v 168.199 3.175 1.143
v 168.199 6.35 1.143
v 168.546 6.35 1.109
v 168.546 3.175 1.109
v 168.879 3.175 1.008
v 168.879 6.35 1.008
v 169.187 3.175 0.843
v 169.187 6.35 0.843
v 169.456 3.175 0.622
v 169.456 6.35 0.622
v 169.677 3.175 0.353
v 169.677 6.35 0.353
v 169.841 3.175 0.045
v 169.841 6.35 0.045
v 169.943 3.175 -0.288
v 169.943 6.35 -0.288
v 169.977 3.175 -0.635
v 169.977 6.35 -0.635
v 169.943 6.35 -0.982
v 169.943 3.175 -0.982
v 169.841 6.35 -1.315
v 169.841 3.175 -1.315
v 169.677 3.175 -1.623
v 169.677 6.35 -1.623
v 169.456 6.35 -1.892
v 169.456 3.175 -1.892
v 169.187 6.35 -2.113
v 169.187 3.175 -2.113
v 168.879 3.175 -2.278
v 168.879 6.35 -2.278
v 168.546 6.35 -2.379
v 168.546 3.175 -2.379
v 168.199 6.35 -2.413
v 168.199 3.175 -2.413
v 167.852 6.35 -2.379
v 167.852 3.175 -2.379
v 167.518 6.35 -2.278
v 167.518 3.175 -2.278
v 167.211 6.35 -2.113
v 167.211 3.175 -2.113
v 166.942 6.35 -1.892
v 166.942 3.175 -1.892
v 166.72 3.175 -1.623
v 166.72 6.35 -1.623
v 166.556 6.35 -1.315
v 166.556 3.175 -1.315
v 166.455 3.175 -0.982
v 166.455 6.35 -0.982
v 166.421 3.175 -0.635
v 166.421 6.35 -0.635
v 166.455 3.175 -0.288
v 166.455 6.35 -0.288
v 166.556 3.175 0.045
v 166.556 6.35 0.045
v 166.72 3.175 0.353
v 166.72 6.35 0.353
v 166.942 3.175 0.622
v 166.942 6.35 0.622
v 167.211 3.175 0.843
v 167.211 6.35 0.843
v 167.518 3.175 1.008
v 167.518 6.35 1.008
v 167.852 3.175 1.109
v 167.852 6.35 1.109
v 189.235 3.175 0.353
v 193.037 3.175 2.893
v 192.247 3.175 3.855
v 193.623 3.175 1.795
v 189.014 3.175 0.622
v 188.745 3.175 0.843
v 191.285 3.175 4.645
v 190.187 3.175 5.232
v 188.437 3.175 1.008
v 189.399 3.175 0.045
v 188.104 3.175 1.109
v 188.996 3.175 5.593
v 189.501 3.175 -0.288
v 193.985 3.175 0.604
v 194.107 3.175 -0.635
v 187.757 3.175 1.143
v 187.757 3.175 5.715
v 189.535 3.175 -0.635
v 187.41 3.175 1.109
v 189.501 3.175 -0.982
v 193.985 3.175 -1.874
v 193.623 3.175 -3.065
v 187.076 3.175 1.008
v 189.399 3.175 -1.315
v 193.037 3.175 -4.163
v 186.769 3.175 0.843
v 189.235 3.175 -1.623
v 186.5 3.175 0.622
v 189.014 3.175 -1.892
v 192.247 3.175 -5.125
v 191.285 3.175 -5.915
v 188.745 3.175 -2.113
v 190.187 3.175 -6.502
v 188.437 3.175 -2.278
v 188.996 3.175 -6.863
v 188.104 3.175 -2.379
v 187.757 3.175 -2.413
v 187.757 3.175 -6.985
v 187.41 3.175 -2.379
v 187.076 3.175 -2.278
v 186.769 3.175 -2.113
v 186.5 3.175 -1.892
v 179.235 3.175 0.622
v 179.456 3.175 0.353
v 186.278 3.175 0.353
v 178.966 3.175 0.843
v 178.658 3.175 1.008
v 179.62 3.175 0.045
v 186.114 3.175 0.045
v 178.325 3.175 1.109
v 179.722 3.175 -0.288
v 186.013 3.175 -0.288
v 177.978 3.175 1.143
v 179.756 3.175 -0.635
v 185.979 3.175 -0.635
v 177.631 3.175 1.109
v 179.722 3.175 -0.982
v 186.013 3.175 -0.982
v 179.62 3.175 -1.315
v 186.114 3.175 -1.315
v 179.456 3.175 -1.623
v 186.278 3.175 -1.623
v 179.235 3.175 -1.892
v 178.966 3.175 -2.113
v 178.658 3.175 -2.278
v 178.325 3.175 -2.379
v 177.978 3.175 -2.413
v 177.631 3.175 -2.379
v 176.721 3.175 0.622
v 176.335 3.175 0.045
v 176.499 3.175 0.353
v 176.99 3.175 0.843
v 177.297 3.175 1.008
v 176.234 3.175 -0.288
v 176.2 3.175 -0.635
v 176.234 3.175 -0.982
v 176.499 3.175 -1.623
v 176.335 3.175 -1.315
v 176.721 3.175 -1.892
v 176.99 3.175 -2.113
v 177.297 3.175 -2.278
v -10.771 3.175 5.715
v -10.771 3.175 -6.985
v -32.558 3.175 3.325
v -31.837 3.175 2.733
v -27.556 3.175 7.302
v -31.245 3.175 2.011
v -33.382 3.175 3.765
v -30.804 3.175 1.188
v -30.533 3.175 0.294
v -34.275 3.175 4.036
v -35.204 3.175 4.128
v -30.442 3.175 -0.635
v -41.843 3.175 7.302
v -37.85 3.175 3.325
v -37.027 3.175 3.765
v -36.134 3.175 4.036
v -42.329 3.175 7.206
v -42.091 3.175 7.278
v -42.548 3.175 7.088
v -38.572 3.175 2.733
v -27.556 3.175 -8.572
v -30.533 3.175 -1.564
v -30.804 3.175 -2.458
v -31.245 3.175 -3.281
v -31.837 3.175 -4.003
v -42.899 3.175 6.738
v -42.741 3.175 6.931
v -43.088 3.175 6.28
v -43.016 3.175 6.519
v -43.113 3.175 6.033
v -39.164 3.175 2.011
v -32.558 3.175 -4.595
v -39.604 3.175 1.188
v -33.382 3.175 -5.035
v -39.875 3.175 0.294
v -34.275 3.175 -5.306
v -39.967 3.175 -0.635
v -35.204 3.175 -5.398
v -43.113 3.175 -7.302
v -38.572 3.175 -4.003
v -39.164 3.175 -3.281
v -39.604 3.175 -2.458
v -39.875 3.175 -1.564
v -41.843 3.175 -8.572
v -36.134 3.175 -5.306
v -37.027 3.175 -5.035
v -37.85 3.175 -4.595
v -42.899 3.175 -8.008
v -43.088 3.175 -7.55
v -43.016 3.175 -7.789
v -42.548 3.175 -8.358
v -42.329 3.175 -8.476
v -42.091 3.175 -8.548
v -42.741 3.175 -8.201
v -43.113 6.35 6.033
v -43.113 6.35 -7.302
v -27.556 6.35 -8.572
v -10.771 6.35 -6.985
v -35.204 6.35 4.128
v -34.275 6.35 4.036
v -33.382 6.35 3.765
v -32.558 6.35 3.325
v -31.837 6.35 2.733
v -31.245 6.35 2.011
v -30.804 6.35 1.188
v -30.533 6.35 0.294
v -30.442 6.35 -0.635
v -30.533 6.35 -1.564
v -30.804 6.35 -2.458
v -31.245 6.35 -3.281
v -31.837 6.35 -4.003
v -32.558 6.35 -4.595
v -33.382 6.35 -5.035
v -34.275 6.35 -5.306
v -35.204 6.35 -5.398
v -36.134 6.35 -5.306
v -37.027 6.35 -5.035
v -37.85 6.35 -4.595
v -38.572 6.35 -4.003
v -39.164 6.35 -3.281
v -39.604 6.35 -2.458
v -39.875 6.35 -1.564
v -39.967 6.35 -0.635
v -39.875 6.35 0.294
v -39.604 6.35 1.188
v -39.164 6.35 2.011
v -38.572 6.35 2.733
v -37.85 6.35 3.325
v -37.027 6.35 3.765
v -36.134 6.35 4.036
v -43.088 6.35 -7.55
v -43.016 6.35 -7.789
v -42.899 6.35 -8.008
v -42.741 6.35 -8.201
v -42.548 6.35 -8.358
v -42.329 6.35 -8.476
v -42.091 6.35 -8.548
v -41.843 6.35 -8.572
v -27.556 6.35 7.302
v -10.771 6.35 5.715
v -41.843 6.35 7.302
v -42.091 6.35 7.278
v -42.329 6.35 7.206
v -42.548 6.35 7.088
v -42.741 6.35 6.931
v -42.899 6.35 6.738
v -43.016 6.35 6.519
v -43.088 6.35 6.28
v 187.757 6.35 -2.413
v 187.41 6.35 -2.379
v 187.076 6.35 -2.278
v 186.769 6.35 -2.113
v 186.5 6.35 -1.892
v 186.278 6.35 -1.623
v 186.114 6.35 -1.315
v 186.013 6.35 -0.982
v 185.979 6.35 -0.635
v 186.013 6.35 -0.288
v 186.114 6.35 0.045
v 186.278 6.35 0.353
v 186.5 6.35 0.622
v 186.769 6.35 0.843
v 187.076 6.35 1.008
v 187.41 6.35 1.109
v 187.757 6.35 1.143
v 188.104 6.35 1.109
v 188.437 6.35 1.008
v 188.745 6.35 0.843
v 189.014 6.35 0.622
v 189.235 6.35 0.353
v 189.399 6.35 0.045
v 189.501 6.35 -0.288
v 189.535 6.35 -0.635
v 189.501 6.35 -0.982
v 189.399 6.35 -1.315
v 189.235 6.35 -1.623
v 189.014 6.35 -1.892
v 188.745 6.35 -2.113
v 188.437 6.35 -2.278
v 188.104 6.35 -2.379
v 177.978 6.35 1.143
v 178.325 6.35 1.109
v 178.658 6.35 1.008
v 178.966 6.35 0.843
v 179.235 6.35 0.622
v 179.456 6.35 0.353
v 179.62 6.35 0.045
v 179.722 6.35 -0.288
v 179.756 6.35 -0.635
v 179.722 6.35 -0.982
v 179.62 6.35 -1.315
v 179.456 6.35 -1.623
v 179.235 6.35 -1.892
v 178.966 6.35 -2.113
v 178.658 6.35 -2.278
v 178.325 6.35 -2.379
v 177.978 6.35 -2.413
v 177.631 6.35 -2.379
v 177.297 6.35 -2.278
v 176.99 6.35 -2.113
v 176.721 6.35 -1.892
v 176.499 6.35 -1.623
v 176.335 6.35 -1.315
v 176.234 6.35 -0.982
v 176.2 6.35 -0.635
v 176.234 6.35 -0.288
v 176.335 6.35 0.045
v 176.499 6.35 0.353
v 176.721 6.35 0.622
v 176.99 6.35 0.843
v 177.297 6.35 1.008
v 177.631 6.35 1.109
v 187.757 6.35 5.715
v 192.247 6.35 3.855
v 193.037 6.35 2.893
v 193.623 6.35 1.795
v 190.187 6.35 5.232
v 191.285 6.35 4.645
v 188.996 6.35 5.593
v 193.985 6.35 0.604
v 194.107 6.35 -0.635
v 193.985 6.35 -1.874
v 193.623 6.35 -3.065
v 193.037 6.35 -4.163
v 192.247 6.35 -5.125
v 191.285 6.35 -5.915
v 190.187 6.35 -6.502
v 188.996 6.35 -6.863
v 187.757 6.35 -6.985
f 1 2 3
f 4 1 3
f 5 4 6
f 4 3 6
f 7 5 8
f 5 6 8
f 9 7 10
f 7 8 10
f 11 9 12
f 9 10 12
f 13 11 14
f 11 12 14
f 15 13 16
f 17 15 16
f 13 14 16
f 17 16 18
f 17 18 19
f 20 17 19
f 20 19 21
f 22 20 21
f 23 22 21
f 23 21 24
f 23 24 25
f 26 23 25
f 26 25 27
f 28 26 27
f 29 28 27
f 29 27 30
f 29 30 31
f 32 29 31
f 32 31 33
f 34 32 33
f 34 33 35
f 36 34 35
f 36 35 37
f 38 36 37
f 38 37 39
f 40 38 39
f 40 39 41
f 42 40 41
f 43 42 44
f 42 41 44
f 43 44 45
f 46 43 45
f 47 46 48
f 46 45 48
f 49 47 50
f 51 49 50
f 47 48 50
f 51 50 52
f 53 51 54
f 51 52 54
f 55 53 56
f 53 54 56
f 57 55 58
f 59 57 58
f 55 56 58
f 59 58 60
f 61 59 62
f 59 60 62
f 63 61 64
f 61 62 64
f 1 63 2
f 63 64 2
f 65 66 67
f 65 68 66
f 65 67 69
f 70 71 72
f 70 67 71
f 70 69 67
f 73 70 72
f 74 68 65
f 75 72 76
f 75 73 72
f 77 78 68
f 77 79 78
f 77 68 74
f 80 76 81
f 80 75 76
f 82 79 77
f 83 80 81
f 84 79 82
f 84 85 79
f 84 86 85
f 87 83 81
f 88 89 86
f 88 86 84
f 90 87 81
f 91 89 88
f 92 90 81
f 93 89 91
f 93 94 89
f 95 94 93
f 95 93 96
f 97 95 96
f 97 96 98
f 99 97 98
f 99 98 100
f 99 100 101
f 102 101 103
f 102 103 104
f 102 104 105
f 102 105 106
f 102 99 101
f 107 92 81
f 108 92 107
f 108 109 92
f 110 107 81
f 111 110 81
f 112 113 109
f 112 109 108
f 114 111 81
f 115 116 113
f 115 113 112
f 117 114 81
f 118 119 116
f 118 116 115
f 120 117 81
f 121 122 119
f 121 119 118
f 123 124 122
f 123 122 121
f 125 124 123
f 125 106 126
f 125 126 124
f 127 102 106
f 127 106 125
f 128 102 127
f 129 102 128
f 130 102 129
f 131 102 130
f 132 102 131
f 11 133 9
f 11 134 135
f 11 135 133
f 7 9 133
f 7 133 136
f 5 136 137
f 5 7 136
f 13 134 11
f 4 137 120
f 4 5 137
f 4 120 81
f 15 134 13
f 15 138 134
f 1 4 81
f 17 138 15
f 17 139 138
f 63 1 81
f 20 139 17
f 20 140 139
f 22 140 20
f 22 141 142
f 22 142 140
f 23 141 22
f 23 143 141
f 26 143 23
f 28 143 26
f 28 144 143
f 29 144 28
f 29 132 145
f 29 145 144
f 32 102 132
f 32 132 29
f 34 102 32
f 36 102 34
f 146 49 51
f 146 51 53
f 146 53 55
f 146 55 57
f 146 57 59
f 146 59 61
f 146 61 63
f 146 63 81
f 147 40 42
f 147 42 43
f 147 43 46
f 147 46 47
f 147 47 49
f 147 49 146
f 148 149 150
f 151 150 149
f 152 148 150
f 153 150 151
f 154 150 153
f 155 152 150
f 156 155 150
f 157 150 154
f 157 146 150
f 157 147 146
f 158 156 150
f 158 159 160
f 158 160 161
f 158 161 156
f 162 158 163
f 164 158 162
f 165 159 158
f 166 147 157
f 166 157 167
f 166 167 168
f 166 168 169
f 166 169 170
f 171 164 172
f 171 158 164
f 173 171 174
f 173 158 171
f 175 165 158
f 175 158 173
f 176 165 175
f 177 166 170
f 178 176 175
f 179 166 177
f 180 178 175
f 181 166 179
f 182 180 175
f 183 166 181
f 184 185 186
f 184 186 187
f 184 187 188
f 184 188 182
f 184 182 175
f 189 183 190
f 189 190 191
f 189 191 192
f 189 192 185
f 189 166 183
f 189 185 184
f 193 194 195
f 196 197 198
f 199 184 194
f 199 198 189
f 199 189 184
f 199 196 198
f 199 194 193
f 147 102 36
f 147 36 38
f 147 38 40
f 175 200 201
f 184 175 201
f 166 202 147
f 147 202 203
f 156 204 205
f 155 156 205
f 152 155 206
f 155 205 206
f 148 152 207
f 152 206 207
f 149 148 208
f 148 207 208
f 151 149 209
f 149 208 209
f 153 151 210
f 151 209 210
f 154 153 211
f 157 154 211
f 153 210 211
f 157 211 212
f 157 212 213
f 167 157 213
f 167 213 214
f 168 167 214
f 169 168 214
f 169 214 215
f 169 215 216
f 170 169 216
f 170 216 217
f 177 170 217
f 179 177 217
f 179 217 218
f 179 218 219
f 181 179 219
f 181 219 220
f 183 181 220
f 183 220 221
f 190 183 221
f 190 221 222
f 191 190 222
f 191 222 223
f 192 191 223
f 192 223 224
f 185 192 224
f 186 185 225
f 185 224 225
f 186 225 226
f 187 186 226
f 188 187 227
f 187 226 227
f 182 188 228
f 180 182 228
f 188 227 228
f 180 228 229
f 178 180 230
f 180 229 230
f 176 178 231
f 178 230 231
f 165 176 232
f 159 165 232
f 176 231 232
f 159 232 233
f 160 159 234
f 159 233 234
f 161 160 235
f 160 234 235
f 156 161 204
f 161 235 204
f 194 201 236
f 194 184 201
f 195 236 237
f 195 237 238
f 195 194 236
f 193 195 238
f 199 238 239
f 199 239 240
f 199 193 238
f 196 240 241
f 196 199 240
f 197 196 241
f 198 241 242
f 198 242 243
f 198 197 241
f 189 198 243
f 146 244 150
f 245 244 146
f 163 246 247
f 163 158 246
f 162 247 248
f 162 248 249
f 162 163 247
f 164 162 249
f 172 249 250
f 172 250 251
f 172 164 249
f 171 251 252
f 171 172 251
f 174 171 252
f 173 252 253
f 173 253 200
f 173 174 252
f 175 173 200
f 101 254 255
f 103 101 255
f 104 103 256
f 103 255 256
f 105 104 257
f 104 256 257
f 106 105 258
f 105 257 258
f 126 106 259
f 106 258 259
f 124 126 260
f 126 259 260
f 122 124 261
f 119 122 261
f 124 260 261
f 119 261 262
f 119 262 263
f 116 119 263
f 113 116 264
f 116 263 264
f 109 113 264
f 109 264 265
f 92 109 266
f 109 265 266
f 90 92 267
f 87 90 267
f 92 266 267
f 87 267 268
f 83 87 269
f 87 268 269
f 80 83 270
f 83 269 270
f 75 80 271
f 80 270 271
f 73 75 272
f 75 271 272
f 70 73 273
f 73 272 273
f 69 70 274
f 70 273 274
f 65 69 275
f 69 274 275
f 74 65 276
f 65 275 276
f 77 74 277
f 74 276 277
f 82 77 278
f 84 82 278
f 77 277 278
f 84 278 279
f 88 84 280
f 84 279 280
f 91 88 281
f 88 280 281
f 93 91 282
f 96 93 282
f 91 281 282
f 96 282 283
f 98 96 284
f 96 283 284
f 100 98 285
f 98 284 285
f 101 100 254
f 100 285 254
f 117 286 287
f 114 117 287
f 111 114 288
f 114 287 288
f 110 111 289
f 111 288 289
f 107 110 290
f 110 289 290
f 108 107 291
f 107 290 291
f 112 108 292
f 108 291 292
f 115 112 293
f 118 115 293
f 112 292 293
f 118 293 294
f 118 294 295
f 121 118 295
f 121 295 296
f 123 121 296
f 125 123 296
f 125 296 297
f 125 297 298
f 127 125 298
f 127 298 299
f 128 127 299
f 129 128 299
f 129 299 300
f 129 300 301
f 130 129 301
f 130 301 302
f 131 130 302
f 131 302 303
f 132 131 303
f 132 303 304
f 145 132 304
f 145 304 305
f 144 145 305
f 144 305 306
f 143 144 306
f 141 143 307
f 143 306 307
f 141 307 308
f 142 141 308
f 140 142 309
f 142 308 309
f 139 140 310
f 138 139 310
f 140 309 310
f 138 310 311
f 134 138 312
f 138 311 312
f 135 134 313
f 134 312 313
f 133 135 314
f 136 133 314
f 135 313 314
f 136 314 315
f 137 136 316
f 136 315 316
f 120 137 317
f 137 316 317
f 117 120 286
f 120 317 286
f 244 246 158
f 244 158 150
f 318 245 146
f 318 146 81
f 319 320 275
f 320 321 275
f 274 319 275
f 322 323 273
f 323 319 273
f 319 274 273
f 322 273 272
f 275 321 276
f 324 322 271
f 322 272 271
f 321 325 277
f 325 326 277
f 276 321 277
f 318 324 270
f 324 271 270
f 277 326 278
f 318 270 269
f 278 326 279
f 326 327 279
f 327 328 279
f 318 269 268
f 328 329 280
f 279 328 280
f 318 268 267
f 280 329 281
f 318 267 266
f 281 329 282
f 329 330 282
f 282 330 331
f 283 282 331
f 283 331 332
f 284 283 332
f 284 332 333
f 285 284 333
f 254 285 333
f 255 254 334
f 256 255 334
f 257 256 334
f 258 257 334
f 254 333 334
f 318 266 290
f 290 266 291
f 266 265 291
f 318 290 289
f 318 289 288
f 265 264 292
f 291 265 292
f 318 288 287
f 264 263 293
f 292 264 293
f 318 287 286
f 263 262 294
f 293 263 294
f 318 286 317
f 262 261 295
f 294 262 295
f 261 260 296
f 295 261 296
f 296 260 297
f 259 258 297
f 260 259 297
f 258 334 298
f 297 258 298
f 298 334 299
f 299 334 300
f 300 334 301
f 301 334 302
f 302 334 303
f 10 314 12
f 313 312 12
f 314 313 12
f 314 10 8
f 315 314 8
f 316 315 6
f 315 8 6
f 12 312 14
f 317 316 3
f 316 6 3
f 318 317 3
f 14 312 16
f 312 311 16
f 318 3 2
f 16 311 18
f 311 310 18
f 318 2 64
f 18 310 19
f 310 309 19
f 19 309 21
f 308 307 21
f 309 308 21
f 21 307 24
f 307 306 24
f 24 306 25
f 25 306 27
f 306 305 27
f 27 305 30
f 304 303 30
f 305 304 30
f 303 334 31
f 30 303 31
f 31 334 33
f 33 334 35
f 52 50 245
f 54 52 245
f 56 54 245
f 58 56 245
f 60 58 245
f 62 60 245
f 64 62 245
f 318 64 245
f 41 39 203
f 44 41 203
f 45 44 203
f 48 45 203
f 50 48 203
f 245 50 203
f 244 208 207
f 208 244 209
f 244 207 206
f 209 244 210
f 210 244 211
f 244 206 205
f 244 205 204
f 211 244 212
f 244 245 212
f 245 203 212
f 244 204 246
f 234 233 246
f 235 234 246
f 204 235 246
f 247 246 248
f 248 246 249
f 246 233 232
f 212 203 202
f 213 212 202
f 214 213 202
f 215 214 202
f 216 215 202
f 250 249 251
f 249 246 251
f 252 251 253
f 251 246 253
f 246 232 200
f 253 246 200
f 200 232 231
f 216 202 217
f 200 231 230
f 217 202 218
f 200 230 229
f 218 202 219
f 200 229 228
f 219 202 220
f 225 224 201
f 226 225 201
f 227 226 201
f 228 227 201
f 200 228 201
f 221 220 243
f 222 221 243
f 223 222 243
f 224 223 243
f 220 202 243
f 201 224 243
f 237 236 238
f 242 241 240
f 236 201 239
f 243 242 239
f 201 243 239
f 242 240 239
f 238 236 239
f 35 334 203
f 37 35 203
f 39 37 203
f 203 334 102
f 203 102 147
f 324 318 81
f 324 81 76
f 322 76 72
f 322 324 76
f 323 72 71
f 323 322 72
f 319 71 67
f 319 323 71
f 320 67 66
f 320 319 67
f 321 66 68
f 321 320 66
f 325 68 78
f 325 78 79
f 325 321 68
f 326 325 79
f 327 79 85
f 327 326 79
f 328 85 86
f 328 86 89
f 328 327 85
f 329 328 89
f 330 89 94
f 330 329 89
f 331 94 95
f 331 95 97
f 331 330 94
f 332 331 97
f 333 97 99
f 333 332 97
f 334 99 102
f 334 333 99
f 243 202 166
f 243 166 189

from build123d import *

# Parameters (mm, degrees)
SKETCH1_R           = 1.778
BOSS_EXTRUDE1_DEPTH = 3.175
SKETCH2_W           = 165.78896247
SKETCH2_H           = 45.115138018
CUT_EXTRUDE1_DEPTH  = 127
SKETCH3_R           = 4.7625
CUT_EXTRUDE2_DEPTH  = 127
SKETCH4_R           = 1.778
CUT_EXTRUDE3_DEPTH  = 127
BOSS_EXTRUDE2_DEPTH = 3.175
FILLET3_R           = 1.27
BOSS_EXTRUDE3_DEPTH = 3.175


with BuildPart() as part:
    # Sketch1 → Boss-Extrude1 (new body)
    with BuildSketch(Plane(origin=(0, 6.35, 0), x_dir=(1, 0, 0), z_dir=(0, 1, 0))):
        with BuildLine():
            Line((187.7568, 6.985), (-187.7568, 6.985))
            ThreePointArc((-187.7568, 6.985), (-194.1068, 0.635), (-187.7568, -5.715))
            Line((-187.7568, -5.715), (187.7568, -5.715))
            ThreePointArc((187.7568, -5.715), (194.1068, 0.635), (187.7568, 6.985))
        make_face()
        with Locations(Location((187.7568, 0.635, 0), (0, 0, 90))):
            Circle(SKETCH1_R, mode=Mode.SUBTRACT)
        with Locations(Location((-187.7568, 0.635, 0), (0, 0, 90))):
            Circle(SKETCH1_R, mode=Mode.SUBTRACT)
    extrude(amount=-BOSS_EXTRUDE1_DEPTH)

    # Sketch2 → Cut-Extrude1 (cut)
    with BuildSketch(Plane(origin=(0, 6.35, 0), x_dir=(1, 0, 0), z_dir=(0, 1, 0))):
        with Locations((-124.419845051, -4.918181187)):
            Rectangle(SKETCH2_W, SKETCH2_H)
    extrude(amount=-CUT_EXTRUDE1_DEPTH, mode=Mode.SUBTRACT)

    # Sketch3 → Cut-Extrude2 (cut)
    with BuildSketch(Plane(origin=(0, 6.35, 0), x_dir=(1, 0, 0), z_dir=(0, 1, 0))):
        with Locations(Location((-35.2044, 0.635, 0), (0, 0, 270))):
            Circle(SKETCH3_R)
    extrude(amount=-CUT_EXTRUDE2_DEPTH, mode=Mode.SUBTRACT)

    # Sketch4 → Cut-Extrude3 (cut)
    with BuildSketch(Plane(origin=(0, 6.35, 0), x_dir=(1, 0, 0), z_dir=(0, 1, 0))):
        with Locations(Location((168.1988, 0.635, 0), (0, 0, 270))):
            Circle(SKETCH4_R)
        with Locations(Location((177.9778, 0.635, 0), (0, 0, 270))):
            Circle(SKETCH4_R)
    extrude(amount=-CUT_EXTRUDE3_DEPTH, mode=Mode.SUBTRACT)

    # Sketch5 → Boss-Extrude2 (add)
    with BuildSketch(Plane(origin=(0, 6.35, 0), x_dir=(1, 0, 0), z_dir=(0, 1, 0))):
        Polygon((-27.555842436, 6.985), (-41.525363816, 6.985), (-41.525363816, -5.715), (-27.555842436, -5.715), (-27.555842436, -7.3025), (-41.525363816, -7.3025), (-43.112863816, -7.3025), (-43.112863816, 8.5725), (-41.525363816, 8.5725), (-27.555842436, 8.5725), align=None)
    extrude(amount=-BOSS_EXTRUDE2_DEPTH)

    # Fillet3
    fillet3_edges = [part.edges().sort_by_distance(p)[0] for p in [
        (-43.112863816, 4.7625, 7.3025),
        (-43.112863816, 4.7625, -8.5725),
    ]]
    fillet(fillet3_edges, radius=FILLET3_R)

    # Sketch6 → Boss-Extrude3 (add)
    with BuildSketch(Plane(origin=(0, 6.35, 0), x_dir=(1, 0, 0), z_dir=(0, 1, 0))):
        Polygon((-27.555842436, 8.5725), (-10.771352163, 6.985), (-27.555842436, 6.985), align=None)
        Polygon((-27.555842436, -7.3025), (-10.771352163, -5.715), (-27.555842436, -5.715), align=None)
    extrude(amount=-BOSS_EXTRUDE3_DEPTH)


solid = part.part
